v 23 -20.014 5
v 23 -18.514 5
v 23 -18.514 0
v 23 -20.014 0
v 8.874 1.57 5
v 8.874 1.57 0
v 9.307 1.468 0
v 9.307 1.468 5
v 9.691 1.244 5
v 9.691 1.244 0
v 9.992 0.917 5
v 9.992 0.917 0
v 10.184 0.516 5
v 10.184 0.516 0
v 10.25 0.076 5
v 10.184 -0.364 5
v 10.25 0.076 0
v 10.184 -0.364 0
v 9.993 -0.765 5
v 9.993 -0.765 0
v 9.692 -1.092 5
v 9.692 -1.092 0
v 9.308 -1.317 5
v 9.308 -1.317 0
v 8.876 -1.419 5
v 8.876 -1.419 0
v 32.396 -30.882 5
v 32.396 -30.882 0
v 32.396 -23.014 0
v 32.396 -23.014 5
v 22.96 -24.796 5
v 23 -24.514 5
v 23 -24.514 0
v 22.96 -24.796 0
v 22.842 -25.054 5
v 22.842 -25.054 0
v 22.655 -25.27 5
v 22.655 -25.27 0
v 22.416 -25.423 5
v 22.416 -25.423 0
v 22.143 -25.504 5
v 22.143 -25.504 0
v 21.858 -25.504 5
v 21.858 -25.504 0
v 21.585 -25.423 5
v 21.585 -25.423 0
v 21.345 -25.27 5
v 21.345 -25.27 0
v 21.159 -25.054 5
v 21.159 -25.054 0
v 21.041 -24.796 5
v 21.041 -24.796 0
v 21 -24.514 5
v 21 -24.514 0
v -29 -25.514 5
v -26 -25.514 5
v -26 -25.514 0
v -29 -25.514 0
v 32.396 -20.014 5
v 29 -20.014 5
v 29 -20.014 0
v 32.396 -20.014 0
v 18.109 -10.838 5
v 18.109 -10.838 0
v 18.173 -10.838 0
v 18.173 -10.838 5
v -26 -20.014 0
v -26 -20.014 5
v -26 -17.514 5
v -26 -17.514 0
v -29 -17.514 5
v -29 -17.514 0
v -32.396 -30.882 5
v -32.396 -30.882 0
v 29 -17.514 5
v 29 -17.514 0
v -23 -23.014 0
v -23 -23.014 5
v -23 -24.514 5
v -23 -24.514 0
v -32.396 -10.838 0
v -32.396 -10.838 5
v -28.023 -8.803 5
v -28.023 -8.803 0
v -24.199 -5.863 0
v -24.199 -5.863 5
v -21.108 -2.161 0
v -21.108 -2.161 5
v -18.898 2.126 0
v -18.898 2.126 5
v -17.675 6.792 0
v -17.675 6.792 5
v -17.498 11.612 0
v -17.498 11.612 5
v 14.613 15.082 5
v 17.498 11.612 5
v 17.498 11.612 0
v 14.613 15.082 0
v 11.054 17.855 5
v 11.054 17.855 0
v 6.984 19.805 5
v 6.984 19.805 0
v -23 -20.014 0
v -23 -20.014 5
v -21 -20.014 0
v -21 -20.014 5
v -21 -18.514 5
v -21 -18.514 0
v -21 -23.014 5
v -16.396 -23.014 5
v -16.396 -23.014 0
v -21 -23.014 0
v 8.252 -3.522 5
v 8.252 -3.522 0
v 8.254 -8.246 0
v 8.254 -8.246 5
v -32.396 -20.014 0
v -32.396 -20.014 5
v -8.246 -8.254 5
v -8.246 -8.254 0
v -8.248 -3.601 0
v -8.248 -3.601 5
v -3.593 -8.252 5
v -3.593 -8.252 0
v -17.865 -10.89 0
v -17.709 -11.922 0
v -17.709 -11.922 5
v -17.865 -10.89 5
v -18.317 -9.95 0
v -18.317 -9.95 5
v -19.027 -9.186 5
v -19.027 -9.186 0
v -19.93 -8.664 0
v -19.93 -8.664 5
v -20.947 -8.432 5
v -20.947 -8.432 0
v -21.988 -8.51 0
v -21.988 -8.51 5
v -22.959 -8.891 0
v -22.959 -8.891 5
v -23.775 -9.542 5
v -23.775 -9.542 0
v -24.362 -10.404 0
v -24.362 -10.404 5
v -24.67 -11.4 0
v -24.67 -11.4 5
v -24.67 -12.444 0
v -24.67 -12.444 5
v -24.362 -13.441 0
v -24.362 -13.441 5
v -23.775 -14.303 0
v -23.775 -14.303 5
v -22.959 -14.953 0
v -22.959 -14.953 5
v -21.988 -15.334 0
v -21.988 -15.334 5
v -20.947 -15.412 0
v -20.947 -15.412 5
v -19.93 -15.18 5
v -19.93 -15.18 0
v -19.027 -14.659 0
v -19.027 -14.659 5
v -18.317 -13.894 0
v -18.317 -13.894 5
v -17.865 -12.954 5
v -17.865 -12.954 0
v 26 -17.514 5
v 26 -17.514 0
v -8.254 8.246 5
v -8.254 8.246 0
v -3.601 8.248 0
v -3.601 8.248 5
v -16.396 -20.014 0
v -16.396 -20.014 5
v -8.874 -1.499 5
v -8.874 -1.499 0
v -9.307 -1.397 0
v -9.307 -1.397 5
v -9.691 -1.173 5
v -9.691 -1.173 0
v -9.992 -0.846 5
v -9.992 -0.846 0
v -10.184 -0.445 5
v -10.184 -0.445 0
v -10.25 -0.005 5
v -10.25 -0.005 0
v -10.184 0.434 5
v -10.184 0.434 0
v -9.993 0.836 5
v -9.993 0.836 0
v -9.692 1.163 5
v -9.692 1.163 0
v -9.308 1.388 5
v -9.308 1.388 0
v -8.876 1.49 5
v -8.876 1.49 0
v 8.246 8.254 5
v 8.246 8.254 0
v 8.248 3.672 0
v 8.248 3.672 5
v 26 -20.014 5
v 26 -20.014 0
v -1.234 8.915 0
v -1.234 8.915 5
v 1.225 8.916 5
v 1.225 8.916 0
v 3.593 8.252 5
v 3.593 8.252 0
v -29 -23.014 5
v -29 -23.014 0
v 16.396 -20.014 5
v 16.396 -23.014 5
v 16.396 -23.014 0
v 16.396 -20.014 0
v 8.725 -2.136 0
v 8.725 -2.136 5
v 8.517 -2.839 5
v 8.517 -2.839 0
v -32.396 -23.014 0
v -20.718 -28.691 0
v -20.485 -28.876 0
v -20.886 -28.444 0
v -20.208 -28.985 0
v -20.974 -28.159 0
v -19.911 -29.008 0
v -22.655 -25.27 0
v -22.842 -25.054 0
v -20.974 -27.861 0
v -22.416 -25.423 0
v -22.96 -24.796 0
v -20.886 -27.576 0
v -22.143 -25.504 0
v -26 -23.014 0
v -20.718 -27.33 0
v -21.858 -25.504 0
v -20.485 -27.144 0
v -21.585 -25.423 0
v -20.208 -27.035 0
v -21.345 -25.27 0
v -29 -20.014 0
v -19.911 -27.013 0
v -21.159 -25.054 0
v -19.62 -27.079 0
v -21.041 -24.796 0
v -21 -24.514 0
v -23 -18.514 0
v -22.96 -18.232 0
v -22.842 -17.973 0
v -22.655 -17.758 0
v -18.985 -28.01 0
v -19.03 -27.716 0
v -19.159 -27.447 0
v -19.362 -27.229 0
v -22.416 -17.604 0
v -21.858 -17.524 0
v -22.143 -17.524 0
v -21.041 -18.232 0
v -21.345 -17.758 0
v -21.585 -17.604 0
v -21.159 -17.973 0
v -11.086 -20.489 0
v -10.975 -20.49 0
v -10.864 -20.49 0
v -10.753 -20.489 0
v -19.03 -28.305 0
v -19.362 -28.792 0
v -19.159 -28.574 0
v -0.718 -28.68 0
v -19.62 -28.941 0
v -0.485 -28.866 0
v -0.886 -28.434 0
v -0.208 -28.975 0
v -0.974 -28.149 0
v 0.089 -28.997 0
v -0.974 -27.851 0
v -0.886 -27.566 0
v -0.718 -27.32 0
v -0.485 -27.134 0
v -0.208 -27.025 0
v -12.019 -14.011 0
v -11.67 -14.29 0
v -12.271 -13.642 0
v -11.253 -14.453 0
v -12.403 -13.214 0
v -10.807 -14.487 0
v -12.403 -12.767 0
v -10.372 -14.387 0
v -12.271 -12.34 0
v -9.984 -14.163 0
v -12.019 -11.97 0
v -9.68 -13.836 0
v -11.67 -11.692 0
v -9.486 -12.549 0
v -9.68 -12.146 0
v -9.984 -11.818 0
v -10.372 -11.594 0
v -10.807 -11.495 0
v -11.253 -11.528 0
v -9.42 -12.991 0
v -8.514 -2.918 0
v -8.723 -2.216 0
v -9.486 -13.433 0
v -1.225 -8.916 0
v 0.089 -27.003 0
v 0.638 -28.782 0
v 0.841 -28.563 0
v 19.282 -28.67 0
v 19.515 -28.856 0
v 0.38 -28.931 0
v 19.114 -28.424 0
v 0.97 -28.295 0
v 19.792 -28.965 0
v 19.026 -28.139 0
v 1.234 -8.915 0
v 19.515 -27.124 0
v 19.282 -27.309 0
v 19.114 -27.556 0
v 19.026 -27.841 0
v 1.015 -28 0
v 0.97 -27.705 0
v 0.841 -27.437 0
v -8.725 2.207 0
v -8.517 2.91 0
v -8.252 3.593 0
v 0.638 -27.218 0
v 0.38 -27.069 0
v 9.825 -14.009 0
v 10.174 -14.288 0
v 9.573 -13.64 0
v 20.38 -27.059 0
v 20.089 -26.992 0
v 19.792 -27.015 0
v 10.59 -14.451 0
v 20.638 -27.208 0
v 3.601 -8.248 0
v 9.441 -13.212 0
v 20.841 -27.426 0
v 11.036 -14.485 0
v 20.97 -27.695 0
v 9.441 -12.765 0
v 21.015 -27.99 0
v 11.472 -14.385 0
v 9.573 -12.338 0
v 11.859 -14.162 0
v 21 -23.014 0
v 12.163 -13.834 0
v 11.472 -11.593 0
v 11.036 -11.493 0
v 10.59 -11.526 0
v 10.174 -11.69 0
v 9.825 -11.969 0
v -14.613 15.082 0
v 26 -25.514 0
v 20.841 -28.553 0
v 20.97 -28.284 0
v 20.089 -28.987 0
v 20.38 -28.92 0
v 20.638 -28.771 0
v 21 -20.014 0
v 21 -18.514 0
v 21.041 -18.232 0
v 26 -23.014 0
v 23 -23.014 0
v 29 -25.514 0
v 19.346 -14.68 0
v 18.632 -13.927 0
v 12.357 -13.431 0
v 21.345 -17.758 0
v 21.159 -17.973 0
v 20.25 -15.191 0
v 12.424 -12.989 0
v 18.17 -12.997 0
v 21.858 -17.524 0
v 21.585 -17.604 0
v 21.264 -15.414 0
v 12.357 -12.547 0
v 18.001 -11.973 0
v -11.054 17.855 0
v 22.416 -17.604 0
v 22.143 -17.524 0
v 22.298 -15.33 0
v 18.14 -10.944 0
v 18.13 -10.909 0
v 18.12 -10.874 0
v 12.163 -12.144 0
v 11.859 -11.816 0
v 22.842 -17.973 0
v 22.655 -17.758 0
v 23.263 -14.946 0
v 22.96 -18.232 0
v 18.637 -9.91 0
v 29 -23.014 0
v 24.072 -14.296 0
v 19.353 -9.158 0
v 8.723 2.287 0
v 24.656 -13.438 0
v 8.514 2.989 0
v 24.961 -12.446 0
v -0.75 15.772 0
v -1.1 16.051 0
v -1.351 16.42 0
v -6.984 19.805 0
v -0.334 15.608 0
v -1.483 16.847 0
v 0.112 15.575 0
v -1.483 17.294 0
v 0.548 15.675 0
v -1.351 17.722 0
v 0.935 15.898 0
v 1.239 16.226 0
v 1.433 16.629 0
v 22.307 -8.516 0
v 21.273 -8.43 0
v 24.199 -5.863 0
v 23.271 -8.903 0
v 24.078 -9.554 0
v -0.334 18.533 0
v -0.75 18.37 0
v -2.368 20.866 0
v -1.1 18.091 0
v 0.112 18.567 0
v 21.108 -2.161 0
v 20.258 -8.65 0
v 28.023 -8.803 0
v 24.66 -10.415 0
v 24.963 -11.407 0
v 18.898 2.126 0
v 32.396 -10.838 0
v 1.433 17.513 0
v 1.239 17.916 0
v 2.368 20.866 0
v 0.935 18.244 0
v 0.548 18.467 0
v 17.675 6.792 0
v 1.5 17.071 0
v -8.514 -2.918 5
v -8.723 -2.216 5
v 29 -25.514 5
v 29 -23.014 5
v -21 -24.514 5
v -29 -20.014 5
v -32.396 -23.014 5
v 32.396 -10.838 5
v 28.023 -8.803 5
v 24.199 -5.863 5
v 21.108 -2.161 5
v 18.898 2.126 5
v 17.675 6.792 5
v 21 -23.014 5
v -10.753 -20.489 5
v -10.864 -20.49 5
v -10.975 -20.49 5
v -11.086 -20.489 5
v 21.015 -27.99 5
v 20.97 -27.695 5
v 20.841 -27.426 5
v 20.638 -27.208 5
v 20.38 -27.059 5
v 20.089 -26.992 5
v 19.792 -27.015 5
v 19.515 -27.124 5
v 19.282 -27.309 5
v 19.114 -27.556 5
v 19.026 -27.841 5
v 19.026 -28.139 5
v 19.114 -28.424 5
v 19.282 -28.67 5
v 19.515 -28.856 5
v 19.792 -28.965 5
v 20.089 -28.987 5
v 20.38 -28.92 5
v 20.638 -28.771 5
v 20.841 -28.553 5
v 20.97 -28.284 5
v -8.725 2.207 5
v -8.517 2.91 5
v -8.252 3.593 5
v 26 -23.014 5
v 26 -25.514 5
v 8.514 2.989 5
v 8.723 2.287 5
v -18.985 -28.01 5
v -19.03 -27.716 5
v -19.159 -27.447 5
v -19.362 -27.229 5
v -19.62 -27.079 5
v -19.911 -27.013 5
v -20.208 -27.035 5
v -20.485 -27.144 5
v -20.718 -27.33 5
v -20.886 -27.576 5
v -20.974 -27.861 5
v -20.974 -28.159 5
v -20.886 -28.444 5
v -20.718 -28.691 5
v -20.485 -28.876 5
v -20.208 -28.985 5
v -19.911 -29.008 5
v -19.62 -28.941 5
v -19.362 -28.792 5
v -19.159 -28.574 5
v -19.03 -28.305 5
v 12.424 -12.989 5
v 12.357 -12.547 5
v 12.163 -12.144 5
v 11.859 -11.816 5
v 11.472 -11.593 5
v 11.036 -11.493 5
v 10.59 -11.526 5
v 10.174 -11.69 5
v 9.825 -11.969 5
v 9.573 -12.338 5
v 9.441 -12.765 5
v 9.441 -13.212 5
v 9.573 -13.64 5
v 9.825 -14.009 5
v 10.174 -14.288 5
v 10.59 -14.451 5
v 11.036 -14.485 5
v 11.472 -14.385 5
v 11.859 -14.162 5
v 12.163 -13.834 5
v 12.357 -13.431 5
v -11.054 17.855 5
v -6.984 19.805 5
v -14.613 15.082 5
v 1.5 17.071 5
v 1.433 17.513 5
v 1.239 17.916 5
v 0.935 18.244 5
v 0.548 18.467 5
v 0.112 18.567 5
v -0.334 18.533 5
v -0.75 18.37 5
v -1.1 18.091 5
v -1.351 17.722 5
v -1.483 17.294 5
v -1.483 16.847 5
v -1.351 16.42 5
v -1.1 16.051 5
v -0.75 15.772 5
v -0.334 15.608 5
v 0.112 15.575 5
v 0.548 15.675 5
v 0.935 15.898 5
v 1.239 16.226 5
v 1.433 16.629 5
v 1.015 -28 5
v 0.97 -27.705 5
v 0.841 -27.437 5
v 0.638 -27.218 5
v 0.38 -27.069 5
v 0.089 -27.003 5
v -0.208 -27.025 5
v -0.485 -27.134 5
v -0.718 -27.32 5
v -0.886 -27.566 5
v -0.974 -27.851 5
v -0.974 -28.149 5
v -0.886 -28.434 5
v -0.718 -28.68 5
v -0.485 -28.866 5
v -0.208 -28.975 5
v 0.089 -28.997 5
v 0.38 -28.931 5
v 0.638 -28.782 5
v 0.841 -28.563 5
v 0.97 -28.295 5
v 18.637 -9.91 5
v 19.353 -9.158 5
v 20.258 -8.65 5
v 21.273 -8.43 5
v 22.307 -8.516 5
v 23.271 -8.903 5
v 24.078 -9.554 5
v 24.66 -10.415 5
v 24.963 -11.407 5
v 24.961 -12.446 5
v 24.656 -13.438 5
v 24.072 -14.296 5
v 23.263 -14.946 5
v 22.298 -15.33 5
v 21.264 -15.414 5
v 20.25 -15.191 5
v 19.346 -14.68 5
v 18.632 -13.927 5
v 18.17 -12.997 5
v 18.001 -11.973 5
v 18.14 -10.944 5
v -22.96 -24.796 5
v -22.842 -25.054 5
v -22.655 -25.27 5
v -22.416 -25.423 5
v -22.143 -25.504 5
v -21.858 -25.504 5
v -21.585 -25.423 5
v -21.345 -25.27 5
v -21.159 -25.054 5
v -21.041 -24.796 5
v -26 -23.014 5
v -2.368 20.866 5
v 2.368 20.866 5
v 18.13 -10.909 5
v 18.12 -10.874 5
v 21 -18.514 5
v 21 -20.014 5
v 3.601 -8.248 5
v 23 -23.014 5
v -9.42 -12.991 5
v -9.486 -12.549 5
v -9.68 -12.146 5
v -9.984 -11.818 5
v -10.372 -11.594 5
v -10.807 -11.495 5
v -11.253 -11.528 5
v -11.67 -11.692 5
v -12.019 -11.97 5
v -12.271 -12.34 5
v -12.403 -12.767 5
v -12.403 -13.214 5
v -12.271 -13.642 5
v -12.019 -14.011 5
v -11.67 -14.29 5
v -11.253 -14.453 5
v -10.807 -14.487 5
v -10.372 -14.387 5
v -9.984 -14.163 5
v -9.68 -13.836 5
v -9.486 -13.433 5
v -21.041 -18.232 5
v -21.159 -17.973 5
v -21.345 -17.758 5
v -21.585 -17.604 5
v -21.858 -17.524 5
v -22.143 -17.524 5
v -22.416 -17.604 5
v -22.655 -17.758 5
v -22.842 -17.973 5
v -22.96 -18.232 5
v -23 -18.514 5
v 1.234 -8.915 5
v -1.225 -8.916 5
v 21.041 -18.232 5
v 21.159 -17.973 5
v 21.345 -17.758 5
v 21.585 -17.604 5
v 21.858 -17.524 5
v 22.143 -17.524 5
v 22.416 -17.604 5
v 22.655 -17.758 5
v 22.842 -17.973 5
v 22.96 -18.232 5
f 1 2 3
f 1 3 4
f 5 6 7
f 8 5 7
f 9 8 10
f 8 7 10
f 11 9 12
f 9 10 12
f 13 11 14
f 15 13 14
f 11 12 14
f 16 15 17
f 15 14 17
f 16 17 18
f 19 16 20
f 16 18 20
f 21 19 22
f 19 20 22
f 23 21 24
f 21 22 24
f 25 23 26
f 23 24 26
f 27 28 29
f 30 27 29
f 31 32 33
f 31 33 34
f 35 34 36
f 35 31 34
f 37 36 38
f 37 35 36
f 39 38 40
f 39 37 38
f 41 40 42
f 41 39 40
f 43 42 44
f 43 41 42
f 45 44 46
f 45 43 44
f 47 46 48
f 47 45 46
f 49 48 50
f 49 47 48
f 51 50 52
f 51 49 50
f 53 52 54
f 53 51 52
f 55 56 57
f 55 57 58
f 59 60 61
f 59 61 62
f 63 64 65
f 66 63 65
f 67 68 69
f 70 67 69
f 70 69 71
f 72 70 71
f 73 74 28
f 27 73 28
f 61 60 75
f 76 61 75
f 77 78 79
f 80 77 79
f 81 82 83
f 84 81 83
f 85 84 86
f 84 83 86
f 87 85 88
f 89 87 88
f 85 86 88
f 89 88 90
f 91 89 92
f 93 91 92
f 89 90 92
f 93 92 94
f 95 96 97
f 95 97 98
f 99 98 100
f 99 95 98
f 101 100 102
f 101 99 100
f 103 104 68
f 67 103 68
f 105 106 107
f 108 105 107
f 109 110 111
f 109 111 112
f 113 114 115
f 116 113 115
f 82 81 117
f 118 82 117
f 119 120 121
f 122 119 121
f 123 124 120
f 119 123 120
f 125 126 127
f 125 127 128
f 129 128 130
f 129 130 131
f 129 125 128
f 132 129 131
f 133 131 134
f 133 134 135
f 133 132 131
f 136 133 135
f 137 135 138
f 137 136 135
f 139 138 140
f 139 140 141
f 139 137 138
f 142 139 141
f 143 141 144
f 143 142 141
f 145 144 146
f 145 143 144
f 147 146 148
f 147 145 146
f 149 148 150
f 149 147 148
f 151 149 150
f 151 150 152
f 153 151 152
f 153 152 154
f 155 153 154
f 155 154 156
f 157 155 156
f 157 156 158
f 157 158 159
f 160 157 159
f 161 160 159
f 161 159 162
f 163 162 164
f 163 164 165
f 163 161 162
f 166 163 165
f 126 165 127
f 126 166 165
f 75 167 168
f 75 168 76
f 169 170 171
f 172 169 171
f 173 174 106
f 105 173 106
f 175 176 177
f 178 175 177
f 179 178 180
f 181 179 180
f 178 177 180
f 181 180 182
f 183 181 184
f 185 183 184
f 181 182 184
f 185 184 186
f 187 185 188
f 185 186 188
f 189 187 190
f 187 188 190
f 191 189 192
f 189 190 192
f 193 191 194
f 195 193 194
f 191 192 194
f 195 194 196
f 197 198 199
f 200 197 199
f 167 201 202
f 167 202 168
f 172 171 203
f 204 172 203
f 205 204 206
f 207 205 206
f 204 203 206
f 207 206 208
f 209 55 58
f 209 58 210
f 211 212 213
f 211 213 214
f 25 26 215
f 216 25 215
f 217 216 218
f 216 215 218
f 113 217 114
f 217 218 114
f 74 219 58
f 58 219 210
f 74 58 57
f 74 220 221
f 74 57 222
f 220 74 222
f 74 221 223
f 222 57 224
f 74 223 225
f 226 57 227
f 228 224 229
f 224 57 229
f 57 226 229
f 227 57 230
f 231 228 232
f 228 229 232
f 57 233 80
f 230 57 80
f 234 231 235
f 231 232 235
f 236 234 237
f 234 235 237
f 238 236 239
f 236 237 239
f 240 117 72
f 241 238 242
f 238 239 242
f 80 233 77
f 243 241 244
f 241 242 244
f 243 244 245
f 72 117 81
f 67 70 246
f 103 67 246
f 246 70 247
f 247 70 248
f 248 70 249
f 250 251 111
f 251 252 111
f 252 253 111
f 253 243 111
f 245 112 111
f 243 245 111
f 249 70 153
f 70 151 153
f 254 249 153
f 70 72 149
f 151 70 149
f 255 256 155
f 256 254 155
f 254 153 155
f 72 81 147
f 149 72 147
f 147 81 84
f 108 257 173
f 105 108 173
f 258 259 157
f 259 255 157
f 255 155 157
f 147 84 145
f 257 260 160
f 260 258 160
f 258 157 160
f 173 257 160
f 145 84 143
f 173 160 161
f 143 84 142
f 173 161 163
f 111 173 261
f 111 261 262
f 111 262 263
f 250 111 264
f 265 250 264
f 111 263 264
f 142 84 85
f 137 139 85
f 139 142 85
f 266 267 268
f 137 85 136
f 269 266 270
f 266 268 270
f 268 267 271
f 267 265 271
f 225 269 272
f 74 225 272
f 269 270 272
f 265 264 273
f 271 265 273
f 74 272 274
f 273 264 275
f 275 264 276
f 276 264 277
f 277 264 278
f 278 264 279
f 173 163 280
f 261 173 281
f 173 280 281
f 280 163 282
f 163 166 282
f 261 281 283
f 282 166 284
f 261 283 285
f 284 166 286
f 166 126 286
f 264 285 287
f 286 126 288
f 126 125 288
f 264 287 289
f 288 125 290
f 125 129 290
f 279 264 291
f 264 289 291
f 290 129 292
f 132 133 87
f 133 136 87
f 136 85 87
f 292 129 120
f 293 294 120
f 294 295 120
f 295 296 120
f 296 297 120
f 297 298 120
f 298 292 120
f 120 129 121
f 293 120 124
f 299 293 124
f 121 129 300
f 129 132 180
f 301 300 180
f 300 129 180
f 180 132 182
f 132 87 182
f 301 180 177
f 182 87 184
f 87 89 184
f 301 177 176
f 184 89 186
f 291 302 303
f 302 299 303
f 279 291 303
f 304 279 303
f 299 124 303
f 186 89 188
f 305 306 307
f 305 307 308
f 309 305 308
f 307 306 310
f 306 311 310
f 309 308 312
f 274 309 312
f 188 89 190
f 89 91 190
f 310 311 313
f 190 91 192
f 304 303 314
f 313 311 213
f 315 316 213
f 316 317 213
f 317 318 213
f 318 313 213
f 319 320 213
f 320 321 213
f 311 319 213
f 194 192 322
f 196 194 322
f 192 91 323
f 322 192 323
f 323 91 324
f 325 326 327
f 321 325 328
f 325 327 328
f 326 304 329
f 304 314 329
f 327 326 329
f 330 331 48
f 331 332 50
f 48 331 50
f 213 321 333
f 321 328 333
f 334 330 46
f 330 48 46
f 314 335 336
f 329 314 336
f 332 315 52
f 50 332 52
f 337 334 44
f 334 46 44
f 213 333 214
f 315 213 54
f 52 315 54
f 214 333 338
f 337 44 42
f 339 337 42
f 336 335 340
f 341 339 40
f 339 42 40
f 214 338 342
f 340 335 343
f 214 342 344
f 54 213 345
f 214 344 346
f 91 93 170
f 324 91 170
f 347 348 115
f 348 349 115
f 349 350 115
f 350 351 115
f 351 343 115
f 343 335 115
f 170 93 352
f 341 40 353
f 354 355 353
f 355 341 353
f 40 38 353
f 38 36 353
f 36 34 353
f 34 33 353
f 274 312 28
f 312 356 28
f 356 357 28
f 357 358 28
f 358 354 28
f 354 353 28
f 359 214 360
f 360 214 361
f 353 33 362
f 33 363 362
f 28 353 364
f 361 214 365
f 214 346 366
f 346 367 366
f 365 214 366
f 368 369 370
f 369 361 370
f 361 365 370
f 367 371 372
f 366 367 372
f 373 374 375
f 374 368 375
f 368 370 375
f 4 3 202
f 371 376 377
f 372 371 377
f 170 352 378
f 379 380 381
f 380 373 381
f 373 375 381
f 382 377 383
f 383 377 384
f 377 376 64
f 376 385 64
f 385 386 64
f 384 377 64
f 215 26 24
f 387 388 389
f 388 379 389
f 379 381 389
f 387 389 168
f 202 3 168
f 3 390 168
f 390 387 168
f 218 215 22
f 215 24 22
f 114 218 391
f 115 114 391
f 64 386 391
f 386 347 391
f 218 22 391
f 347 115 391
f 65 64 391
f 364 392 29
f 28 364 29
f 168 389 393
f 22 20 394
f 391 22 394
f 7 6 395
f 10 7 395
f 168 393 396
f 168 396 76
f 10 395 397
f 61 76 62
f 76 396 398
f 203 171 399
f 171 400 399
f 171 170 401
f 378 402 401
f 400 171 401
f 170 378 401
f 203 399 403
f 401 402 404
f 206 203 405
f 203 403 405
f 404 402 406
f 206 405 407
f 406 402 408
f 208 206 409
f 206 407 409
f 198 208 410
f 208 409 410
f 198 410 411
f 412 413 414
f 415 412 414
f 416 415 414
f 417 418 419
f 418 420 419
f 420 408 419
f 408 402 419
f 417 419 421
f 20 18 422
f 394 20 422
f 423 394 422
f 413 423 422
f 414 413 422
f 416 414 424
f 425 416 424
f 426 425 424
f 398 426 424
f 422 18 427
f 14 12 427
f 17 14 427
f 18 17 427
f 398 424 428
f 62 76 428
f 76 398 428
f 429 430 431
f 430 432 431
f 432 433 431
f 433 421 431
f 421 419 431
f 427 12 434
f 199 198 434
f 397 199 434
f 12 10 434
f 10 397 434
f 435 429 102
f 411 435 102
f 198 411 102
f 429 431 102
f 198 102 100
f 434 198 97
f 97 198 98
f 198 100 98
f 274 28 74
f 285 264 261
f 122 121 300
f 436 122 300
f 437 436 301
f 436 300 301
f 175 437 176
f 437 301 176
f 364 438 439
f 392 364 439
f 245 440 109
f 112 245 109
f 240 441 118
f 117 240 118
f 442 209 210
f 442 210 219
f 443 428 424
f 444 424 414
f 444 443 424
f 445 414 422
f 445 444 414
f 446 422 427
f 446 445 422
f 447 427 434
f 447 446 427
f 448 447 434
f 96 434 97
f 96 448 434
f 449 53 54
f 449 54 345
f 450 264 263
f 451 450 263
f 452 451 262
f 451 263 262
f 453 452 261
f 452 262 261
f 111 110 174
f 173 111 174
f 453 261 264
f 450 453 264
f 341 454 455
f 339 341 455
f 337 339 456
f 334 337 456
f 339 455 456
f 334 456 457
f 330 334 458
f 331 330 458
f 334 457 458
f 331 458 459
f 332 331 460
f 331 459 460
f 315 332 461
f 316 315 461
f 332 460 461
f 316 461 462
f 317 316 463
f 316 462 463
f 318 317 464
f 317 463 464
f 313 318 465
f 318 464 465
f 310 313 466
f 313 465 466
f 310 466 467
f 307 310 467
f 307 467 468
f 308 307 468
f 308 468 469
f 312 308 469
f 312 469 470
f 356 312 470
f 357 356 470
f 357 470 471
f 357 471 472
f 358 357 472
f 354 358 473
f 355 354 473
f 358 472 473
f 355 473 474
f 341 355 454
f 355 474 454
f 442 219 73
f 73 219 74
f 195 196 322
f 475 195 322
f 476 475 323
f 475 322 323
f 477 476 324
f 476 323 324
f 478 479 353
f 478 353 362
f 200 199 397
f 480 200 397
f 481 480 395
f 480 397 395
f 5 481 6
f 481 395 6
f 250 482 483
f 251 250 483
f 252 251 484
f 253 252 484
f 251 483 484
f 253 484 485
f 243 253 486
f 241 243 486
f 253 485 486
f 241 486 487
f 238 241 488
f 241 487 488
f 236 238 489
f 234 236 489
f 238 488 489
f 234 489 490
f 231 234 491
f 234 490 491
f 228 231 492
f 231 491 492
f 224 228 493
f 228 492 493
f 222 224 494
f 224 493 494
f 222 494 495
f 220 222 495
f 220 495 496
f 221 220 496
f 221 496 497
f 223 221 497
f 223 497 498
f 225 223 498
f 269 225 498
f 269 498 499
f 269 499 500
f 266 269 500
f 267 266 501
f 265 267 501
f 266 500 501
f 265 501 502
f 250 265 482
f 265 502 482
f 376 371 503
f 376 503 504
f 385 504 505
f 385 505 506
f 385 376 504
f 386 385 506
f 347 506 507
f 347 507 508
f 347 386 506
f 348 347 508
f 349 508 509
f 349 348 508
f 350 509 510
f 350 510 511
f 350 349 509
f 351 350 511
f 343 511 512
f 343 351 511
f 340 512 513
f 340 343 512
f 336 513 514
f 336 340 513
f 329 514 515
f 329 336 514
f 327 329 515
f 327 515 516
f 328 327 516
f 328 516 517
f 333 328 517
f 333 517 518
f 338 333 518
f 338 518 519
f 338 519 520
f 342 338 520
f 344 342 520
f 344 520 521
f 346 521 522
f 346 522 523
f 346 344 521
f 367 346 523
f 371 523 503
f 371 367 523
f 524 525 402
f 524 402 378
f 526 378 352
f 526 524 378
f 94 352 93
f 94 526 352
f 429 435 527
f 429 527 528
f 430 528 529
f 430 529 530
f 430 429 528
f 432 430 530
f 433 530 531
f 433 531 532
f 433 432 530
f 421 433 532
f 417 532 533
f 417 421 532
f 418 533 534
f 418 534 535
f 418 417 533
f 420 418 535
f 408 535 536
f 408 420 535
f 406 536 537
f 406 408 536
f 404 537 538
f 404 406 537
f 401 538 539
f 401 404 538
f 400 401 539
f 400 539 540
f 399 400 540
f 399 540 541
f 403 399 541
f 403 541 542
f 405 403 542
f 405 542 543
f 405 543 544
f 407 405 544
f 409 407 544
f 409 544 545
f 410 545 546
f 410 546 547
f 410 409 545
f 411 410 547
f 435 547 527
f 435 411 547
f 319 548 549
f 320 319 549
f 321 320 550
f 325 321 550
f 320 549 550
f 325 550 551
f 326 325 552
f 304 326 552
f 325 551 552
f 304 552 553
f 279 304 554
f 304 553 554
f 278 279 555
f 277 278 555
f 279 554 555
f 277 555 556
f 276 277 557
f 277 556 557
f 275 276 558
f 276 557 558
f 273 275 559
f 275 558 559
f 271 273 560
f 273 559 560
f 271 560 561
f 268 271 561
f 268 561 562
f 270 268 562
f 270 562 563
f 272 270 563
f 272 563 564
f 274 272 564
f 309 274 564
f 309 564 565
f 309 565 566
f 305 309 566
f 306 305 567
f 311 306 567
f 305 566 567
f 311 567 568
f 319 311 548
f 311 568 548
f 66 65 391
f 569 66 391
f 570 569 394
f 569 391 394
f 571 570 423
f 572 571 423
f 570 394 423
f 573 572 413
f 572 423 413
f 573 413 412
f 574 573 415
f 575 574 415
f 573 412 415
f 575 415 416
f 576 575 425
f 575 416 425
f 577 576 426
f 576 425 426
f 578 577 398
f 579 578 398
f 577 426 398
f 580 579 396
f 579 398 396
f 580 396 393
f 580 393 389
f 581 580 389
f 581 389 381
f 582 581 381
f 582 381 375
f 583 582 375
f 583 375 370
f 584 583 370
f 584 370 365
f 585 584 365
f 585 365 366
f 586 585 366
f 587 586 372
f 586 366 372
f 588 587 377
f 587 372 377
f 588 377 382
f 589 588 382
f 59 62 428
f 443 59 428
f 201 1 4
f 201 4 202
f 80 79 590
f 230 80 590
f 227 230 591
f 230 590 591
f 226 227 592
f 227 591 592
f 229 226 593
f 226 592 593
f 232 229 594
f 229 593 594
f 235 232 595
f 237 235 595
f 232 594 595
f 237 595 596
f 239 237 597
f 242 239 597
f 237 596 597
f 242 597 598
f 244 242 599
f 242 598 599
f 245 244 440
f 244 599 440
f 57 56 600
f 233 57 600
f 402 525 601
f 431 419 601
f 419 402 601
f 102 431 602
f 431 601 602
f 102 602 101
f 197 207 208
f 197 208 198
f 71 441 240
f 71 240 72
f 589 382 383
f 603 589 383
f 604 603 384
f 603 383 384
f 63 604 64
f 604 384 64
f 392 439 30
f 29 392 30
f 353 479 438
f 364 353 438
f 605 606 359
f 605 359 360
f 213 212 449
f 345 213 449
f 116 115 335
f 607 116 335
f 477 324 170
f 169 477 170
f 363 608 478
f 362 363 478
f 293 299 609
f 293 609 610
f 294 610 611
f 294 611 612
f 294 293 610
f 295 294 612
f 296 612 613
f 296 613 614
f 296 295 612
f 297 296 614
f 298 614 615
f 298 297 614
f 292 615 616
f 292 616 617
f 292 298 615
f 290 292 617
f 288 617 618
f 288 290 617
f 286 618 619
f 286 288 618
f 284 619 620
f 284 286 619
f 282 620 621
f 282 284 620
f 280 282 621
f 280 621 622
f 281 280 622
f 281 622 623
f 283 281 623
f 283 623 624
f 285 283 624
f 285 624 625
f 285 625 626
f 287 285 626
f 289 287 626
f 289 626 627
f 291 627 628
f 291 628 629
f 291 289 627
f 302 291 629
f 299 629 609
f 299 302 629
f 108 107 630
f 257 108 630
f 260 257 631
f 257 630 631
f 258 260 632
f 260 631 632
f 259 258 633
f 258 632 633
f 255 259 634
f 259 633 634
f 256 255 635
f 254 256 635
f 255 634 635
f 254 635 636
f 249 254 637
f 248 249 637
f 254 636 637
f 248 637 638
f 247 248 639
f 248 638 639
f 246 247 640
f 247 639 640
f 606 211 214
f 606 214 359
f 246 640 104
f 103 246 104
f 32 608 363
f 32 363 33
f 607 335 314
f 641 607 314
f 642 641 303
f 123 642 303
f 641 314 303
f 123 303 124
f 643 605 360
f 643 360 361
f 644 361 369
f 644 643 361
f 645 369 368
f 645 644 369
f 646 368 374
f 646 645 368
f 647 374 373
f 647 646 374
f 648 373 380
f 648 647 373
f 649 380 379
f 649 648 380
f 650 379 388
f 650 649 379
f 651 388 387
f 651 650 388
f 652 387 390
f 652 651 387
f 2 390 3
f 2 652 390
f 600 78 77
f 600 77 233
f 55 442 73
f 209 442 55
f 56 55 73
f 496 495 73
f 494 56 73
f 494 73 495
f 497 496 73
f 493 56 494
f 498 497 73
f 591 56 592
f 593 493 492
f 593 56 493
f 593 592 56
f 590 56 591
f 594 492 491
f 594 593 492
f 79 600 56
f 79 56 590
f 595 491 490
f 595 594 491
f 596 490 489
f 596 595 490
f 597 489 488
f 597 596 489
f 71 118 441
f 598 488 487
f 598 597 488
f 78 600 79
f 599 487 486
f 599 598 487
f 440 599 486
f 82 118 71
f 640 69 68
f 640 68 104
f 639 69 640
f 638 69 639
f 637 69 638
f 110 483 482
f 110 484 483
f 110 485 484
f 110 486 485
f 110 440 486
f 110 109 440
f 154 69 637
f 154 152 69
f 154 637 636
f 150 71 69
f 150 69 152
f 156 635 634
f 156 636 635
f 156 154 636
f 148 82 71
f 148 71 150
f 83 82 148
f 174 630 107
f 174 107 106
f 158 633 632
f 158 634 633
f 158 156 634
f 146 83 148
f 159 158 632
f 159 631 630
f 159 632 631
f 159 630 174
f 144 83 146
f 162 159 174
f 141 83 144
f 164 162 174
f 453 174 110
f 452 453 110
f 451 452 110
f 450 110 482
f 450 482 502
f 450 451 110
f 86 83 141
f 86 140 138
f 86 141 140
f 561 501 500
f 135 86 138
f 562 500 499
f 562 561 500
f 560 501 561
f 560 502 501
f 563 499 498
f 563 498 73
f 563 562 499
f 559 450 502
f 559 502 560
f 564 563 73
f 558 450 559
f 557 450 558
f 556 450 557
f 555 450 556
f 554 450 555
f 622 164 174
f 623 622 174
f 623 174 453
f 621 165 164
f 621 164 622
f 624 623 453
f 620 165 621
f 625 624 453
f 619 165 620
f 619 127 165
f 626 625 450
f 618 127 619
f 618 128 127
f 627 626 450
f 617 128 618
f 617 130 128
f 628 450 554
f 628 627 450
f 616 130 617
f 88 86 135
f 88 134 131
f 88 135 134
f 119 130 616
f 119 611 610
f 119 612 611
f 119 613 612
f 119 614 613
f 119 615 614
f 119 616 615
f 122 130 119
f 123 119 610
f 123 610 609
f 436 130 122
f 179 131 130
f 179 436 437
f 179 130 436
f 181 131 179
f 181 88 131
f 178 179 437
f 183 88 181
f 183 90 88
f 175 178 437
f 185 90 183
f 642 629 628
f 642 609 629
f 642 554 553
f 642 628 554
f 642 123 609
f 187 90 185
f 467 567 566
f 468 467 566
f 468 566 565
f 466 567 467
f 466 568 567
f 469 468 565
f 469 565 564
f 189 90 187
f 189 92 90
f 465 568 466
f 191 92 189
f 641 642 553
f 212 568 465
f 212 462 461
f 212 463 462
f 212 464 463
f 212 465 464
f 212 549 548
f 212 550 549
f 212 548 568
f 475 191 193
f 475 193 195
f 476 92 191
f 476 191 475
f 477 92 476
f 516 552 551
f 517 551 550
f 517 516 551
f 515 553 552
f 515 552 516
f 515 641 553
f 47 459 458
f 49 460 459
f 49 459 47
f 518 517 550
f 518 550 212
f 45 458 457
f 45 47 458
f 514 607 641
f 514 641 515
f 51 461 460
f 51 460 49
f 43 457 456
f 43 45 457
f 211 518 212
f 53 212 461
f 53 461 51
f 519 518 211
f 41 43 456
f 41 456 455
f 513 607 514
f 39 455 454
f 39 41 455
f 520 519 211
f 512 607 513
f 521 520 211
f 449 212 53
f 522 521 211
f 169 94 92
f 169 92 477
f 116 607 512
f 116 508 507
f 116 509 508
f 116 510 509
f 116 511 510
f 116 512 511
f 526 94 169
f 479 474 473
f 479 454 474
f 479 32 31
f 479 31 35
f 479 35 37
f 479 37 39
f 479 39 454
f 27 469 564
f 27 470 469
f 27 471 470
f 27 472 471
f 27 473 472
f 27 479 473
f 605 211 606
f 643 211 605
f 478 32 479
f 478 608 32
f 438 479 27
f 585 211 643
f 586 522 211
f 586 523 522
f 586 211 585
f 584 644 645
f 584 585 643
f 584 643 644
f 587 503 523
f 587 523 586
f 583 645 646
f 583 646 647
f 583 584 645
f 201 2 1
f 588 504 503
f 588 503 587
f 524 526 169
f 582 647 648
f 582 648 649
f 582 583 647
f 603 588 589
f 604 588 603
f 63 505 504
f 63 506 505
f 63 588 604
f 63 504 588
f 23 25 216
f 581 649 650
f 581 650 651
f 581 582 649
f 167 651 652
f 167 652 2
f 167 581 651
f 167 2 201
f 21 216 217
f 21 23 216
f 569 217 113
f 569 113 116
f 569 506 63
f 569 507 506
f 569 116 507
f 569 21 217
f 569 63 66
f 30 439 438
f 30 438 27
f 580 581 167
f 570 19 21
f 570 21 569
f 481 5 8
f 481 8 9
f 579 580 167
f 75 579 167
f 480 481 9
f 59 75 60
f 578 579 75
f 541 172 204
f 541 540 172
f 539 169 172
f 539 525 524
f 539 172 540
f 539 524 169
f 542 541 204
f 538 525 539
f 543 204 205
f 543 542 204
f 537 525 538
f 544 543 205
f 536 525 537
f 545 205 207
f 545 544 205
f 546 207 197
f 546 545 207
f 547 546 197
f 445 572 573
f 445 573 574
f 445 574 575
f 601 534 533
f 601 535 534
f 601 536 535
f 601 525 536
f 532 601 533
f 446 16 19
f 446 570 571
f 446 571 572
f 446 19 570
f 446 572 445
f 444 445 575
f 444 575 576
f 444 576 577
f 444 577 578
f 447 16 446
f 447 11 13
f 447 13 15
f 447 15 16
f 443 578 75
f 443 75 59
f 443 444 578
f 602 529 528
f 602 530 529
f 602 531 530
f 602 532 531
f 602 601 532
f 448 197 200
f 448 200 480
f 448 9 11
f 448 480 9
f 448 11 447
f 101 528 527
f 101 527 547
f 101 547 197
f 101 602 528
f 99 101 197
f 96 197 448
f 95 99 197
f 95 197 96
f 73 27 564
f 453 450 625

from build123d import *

# Parameters (mm, degrees)
SKETCH1_R           = 3.5
SKETCH1_R_2         = 1.5
BOSS_EXTRUDE1_DEPTH = 5
SKETCH2_W           = 3
SKETCH2_H           = 8
SKETCH2_W_2         = 16
SKETCH2_H_2         = 3
CUT_EXTRUDE3_DEPTH  = 10
SKETCH4_OUTSIDE_W   = 83.878
SKETCH4_OUTSIDE_H   = 74.539
CUT_EXTRUDE5_DEPTH  = 10
BOSS_EXTRUDE2_DEPTH = 5
SKETCH5_R           = 1
CUT_EXTRUDE6_DEPTH  = 5
CUT_EXTRUDE7_DEPTH  = 46.035343011


with BuildPart() as part:
    # Sketch1 → Boss-Extrude1 (new body)
    with BuildSketch(Plane.XY):
        with BuildLine():
            Line((16.678684739, -6.865443356), (7.048954955, 19.63254949))
            ThreePointArc((7.048954955, 19.63254949), (-0.000574134, 24.570863688), (-7.049347073, 19.631470247))
            Line((-7.049347073, 19.631470247), (-16.60248251, -6.668301445))
            ThreePointArc((-16.60248251, -6.668301445), (-23.589225287, -5.352701736), (-28.111762071, -10.838322782))
            Line((-28.111762071, -10.838322782), (-32.396038203, -10.838322782))
            Line((-32.396038203, -10.838322782), (-32.396038203, -30.881690835))
            Line((-32.396038203, -30.881690835), (32.396038203, -30.881690835))
            Line((32.396038203, -30.881690835), (32.396038203, -10.838322782))
            Line((32.396038203, -10.838322782), (28.403544795, -10.838322782))
            ThreePointArc((28.403544795, -10.838322782), (23.74315896, -5.304380506), (16.678684739, -6.865443356))
        make_face()
        with Locations((-21.209007359, -11.922115015)):
            Circle(SKETCH1_R, mode=Mode.SUBTRACT)
        with BuildLine():
            Line((3.592595297, 8.251863973), (8.245757774, 8.254276772))
            Line((8.245757774, 8.254276772), (8.248133809, 3.67201473))
            ThreePointArc((8.248133809, 3.67201473), (8.625435504, 2.640272663), (8.874223719, 1.570248043))
            ThreePointArc((8.874223719, 1.570248043), (10.249998622, 0.076178628), (8.875773895, -1.41931674))
            ThreePointArc((8.875773895, -1.41931674), (8.62809549, -2.489598792), (8.251863973, -3.521731588))
            Line((8.251863973, -3.521731588), (8.254313497, -8.24572101))
            Line((8.254313497, -8.24572101), (3.601151021, -8.248133809))
            ThreePointArc((3.601151021, -8.248133809), (0.004666758, -8.99999879), (-3.592595297, -8.251863973))
            Line((-3.592595297, -8.251863973), (-8.245721029, -8.254276752))
            Line((-8.245721029, -8.254276752), (-8.248133809, -3.601151021))
            ThreePointArc((-8.248133809, -3.601151021), (-8.625435504, -2.569408953), (-8.874223719, -1.499384334))
            ThreePointArc((-8.874223719, -1.499384334), (-10.249998622, -0.005314919), (-8.875773895, 1.49018045))
            ThreePointArc((-8.875773895, 1.49018045), (-8.62809549, 2.560462502), (-8.251863973, 3.592595297))
            Line((-8.251863973, 3.592595297), (-8.254276752, 8.245721029))
            Line((-8.254276752, 8.245721029), (-3.601151021, 8.248133809))
            ThreePointArc((-3.601151021, 8.248133809), (-0.004666758, 8.99999879), (3.592595297, 8.251863973))
        make_face(mode=Mode.SUBTRACT)
        with Locations((0, 17.070863709)):
            Circle(SKETCH1_R_2, mode=Mode.SUBTRACT)
        with BuildLine():
            ThreePointArc((18.172818569, -10.838322782), (24.845541744, -12.952957548), (18.140100673, -10.944481806))
            ThreePointArc((18.140100673, -10.944481806), (18.124834746, -10.891345307), (18.109177542, -10.838322782))
            Line((18.109177542, -10.838322782), (18.172818569, -10.838322782))
        make_face(mode=Mode.SUBTRACT)
        with BuildLine():
            Line((-11.086043951, -20.488849886), (-10.753093745, -20.488849886))
            ThreePointArc((-10.753093745, -20.488849886), (-10.919568848, -20.490697711), (-11.086043951, -20.488849886))
        make_face(mode=Mode.SUBTRACT)
        with Locations((10.924107384, -12.988849886)):
            Circle(SKETCH1_R_2, mode=Mode.SUBTRACT)
        with Locations((-10.919568848, -12.990697711)):
            Circle(SKETCH1_R_2, mode=Mode.SUBTRACT)
    extrude(amount=BOSS_EXTRUDE1_DEPTH)

    # Sketch2 → Cut-Extrude3 (cut)
    with BuildSketch(Plane.XY.offset(5)):
        with Locations((27.500296009, -21.513780425)):
            Rectangle(SKETCH2_W, SKETCH2_H)
        with Locations((24.396038203, -21.513780425)):
            Rectangle(SKETCH2_W_2, SKETCH2_H_2)
        with BuildLine():
            Line((23.000296009, -18.513780425), (23.000296009, -24.513780425))
            ThreePointArc((23.000296009, -24.513780425), (22.000296009, -25.513780425), (21.000296009, -24.513780425))
            Line((21.000296009, -24.513780425), (21.000296009, -18.513780425))
            ThreePointArc((21.000296009, -18.513780425), (22.000296009, -17.513780425), (23.000296009, -18.513780425))
        make_face()
    cut_extrude3 = extrude(amount=-CUT_EXTRUDE3_DEPTH, mode=Mode.SUBTRACT)

    # Mirror1: Cut-Extrude3 across plane
    add(cut_extrude3.mirror(Plane(origin=(0, 0, 0), x_dir=(0, 0, 1), z_dir=(1, 0, 0))), mode=Mode.SUBTRACT)

    # Sketch4 outside → Cut-Extrude5 (cut)
    with BuildSketch(Plane.XY.offset(5)):
        with Locations((0, -3.1555)):
            Rectangle(SKETCH4_OUTSIDE_W, SKETCH4_OUTSIDE_H)
        with BuildLine():
            Line((-28.111762071, -10.838322782), (-32.396038203, -10.838322782))
            Line((-32.396038203, -10.838322782), (-32.396038203, -30.881690835))
            Line((-32.396038203, -30.881690835), (32.396038203, -30.881690835))
            Line((32.396038203, -30.881690835), (32.396038203, -10.838322782))
            Line((32.396038203, -10.838322782), (28.403544795, -10.838322782))
            ThreePointArc((28.403544795, -10.838322782), (23.74315896, -5.304380506), (16.678684739, -6.865443356))
            Line((16.678684739, -6.865443356), (7.048954955, 19.63254949))
            Line((7.048954955, 19.63254949), (6.984017788, 19.804633184))
            ThreePointArc((6.984017788, 19.804633184), (0, 21), (-6.984017788, 19.804633184))
            Line((-6.984017788, 19.804633184), (-7.049347073, 19.631470247))
            Line((-7.049347073, 19.631470247), (-16.60248251, -6.668301445))
            ThreePointArc((-16.60248251, -6.668301445), (-23.589225287, -5.352701736), (-28.111762071, -10.838322782))
        make_face(mode=Mode.SUBTRACT)
    extrude(amount=-CUT_EXTRUDE5_DEPTH, mode=Mode.SUBTRACT)

    # Sketch4<5> → Boss-Extrude2 (add)
    with BuildSketch(Plane.XY.offset(5)):
        with BuildLine():
            Line((-17.497591027, 11.611817612), (-32.396038203, -10.838322782))
            Line((-32.396038203, -10.838322782), (-28.111762071, -10.838322782))
            ThreePointArc((-28.111762071, -10.838322782), (-23.589225287, -5.352701736), (-16.60248251, -6.668301445))
            Line((-16.60248251, -6.668301445), (-7.049347073, 19.631470247))
            Line((-7.049347073, 19.631470247), (-6.984017788, 19.804633184))
            ThreePointArc((-6.984017788, 19.804633184), (-12.90805366, 16.564484619), (-17.497591027, 11.611817612))
        make_face()
        with BuildLine():
            ThreePointArc((17.497591027, 11.611817612), (12.90805366, 16.564484619), (6.984017788, 19.804633184))
            Line((6.984017788, 19.804633184), (7.048954955, 19.63254949))
            Line((7.048954955, 19.63254949), (16.678684739, -6.865443356))
            ThreePointArc((16.678684739, -6.865443356), (23.74315896, -5.304380506), (28.403544795, -10.838322782))
            Line((28.403544795, -10.838322782), (32.396038203, -10.838322782))
            Line((32.396038203, -10.838322782), (17.497591027, 11.611817612))
        make_face()
    extrude(amount=-BOSS_EXTRUDE2_DEPTH)

    # Sketch5 → Cut-Extrude6 (cut)
    with BuildSketch(Plane.XY.offset(5)):
        with Locations((0.014555548, -27.999996217)):
            Circle(SKETCH5_R)
        with Locations((20.014552859, -27.989625643)):
            Circle(SKETCH5_R)
        with Locations((-19.985441764, -28.01036679)):
            Circle(SKETCH5_R)
    extrude(amount=-CUT_EXTRUDE6_DEPTH, mode=Mode.SUBTRACT)

    # Sketch6 → Cut-Extrude7 (cut, through all)
    with BuildSketch(Plane.XY.offset(5)):
        with BuildLine():
            ThreePointArc((-32.396038203, -10.838322782), (-21.107946915, -2.160816504), (-17.497591027, 11.611817612))
            ThreePointArc((-17.497591027, 11.611817612), (-30.842179781, 4.299051969), (-32.396038203, -10.838322782))
        make_face()
        with BuildLine():
            ThreePointArc((32.396038203, -10.838322782), (21.107946915, -2.160816504), (17.497591027, 11.611817612))
            ThreePointArc((17.497591027, 11.611817612), (30.860111099, 4.310951618), (32.396038203, -10.838322782))
        make_face()
    extrude(amount=-CUT_EXTRUDE7_DEPTH, mode=Mode.SUBTRACT)


solid = part.part
